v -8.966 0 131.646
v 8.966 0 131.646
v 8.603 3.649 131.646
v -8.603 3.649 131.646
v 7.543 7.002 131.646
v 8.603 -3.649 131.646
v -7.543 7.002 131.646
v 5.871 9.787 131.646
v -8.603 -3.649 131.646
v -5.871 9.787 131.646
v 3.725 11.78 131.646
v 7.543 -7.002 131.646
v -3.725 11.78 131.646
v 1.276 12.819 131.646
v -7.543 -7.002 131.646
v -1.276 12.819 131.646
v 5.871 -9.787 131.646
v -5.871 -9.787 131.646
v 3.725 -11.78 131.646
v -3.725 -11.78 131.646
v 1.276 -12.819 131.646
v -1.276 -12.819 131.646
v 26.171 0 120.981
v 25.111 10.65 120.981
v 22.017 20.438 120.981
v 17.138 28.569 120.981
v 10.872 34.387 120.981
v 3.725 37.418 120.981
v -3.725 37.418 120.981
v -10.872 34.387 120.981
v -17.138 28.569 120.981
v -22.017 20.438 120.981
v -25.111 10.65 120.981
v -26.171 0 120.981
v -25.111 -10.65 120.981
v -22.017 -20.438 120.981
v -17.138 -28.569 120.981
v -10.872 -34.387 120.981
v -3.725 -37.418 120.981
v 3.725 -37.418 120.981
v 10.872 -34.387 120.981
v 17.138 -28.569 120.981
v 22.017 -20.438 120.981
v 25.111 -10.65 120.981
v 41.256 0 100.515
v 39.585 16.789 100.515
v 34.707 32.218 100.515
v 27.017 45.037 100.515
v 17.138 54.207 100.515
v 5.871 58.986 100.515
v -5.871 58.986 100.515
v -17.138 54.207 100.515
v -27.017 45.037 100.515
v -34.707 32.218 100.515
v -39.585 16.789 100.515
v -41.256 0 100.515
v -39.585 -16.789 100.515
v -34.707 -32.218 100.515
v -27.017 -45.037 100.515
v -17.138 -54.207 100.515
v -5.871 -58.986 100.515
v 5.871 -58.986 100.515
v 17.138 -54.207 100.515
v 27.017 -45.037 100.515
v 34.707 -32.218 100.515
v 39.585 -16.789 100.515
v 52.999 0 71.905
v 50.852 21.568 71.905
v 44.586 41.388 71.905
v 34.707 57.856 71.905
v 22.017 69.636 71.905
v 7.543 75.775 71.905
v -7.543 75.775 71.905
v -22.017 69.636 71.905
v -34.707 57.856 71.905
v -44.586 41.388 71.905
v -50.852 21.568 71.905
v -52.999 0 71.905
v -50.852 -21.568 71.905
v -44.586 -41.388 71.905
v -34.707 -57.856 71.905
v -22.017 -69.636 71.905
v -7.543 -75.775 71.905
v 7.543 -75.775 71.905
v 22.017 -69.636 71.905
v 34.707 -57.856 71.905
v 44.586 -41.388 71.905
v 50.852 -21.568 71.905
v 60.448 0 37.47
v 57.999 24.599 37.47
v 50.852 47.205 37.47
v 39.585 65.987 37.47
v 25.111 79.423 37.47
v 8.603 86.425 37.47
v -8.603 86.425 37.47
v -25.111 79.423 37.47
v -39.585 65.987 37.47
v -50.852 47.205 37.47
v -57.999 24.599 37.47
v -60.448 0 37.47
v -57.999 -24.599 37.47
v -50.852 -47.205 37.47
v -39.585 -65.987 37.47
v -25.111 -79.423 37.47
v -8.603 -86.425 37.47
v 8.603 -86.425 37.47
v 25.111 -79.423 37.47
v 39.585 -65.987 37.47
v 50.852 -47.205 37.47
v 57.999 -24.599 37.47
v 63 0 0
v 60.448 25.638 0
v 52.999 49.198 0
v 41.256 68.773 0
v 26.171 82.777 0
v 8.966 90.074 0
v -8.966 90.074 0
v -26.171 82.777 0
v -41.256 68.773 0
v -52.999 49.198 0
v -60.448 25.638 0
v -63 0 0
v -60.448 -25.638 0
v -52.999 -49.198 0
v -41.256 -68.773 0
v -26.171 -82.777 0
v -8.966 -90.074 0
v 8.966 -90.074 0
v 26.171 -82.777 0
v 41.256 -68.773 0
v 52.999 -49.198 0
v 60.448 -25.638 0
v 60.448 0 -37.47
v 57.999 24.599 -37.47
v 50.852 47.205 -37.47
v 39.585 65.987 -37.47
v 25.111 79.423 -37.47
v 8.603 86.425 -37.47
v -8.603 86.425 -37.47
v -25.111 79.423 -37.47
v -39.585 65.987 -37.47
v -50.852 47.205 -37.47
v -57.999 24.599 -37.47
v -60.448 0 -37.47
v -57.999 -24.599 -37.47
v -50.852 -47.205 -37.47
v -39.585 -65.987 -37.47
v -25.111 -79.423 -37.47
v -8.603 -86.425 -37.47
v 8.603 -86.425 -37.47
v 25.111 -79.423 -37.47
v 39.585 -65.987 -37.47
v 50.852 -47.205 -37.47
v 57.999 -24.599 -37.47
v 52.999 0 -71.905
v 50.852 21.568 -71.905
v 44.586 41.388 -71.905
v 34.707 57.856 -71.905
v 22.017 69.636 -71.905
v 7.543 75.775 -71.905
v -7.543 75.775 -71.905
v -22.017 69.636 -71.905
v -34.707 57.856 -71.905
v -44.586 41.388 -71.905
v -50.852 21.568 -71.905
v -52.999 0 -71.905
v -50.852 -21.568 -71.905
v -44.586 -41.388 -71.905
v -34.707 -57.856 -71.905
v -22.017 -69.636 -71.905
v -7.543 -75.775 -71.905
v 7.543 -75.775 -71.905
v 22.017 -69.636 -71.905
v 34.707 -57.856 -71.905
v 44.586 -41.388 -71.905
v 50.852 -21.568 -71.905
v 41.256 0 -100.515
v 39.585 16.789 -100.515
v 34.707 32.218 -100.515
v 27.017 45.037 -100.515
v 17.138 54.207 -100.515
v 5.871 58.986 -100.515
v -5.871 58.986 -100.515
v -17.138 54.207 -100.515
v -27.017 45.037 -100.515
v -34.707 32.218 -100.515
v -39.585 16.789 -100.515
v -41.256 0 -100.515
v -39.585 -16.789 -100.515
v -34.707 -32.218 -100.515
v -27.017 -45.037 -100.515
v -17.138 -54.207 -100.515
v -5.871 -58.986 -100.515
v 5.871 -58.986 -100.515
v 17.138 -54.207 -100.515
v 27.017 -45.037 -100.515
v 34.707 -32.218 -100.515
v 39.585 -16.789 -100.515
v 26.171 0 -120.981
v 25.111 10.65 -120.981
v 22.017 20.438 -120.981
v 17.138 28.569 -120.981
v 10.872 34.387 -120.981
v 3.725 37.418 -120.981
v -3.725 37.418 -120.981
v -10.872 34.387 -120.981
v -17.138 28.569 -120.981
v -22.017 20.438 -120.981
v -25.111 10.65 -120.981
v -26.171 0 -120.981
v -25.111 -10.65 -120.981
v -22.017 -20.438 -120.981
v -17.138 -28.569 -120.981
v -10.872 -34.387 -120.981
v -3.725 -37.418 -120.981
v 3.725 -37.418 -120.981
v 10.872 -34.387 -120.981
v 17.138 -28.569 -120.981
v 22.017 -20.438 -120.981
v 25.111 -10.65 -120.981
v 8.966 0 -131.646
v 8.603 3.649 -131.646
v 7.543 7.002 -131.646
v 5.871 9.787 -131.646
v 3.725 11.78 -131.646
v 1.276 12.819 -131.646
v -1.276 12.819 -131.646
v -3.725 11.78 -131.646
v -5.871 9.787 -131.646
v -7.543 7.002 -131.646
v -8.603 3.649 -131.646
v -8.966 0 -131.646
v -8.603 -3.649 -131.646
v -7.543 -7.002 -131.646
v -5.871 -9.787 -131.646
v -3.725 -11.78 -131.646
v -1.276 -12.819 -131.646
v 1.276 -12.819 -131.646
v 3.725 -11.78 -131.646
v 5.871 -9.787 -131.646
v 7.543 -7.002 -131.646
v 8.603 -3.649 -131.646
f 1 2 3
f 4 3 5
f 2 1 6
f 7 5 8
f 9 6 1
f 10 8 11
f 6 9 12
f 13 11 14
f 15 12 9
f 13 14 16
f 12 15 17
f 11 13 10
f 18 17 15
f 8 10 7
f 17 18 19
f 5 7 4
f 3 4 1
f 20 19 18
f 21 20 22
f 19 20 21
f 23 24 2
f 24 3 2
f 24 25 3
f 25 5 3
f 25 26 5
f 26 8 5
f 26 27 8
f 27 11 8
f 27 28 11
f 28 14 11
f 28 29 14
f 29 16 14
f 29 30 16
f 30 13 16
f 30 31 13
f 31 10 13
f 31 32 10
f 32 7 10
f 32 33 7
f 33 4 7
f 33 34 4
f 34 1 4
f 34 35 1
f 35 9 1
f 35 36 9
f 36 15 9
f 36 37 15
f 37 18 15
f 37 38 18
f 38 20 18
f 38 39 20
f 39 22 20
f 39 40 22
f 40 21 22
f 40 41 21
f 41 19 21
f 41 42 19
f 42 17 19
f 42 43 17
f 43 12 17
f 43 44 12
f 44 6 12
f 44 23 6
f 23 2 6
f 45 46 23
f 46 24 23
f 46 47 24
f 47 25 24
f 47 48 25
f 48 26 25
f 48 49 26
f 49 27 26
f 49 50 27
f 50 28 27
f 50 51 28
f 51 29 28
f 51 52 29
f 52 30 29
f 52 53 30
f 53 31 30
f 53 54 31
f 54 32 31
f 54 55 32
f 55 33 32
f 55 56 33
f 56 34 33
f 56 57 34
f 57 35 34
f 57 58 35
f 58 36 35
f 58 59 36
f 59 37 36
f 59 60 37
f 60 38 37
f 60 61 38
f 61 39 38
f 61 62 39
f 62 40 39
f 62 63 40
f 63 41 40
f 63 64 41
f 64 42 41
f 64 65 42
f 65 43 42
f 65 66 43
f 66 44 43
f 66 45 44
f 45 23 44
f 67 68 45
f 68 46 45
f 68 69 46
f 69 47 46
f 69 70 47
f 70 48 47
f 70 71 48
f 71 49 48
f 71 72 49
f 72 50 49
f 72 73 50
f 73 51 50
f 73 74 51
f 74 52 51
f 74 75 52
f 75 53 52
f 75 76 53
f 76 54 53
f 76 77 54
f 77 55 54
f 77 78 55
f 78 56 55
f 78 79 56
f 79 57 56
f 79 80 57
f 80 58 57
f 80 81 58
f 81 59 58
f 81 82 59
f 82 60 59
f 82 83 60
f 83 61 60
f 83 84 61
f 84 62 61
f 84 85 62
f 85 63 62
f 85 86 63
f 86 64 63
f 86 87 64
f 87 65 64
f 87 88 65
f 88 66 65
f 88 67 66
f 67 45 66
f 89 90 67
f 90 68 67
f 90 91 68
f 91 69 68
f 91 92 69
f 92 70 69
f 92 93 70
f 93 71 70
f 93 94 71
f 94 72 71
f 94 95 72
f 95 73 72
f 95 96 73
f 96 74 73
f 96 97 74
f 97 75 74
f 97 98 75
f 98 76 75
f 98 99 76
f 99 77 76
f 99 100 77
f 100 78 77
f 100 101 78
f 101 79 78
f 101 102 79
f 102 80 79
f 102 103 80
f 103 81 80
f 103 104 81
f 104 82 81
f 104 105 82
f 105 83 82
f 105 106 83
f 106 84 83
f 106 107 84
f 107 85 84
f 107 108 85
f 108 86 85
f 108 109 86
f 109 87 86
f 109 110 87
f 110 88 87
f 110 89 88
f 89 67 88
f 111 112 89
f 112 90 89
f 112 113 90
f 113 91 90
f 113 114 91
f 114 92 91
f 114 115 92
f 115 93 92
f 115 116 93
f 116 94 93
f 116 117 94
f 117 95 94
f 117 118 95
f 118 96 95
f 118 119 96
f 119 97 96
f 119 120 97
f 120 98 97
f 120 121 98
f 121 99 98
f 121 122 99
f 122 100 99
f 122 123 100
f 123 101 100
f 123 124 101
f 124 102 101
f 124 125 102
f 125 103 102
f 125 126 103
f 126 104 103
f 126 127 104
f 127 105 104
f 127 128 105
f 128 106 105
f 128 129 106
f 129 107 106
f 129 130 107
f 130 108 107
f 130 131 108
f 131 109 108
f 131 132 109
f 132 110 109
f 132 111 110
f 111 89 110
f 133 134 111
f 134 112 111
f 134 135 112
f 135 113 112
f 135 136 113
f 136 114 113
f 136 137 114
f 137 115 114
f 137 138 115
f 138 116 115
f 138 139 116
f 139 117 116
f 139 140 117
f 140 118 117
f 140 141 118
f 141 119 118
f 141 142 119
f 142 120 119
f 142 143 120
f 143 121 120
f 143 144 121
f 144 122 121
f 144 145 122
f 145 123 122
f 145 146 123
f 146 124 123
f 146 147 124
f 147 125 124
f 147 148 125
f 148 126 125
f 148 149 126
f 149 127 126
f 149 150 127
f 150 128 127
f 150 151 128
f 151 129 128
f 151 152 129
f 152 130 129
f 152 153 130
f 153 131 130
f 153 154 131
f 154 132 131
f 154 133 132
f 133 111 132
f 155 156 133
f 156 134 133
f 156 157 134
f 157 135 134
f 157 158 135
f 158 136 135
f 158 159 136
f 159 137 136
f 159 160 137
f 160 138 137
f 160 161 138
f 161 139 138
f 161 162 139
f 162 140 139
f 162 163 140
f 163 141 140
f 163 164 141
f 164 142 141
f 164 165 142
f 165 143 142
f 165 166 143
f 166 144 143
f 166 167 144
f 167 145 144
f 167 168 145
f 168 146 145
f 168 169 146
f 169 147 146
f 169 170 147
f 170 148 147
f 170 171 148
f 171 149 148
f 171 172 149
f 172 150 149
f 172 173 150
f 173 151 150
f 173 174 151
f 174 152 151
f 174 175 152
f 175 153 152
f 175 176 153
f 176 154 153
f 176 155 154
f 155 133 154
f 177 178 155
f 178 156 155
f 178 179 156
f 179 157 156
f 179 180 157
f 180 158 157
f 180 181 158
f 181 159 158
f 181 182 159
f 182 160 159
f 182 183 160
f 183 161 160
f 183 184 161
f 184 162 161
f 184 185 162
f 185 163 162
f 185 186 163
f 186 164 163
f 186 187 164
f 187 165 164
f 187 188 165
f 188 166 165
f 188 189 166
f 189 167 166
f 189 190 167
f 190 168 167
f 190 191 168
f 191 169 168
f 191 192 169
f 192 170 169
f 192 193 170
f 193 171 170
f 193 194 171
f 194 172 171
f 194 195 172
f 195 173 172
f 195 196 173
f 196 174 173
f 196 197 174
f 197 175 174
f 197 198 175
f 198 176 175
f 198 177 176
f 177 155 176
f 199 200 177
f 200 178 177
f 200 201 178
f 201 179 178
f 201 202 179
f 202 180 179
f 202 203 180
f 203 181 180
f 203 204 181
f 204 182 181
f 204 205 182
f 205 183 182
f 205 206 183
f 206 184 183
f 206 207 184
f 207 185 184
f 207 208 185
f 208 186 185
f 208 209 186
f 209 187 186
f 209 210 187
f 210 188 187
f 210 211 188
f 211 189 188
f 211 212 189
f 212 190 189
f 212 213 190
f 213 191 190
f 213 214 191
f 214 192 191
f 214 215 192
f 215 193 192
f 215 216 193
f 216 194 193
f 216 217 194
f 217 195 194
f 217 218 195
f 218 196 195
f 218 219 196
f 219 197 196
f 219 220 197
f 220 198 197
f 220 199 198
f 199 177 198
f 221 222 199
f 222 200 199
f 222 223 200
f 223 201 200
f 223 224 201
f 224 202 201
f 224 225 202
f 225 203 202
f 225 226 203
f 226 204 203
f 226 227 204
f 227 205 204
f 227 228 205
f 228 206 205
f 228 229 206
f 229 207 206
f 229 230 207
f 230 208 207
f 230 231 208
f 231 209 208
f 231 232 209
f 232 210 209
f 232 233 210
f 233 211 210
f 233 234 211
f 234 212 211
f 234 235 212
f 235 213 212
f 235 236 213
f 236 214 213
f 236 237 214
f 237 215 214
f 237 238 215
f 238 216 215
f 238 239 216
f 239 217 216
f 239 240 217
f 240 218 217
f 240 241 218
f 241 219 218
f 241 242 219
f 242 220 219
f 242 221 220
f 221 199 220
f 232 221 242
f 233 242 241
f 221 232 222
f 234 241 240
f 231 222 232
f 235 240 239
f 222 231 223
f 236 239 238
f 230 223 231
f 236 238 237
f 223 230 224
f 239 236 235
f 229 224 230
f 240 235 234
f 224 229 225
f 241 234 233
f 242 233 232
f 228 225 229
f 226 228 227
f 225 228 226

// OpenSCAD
// Generated by SolidPython 1.0.1 on 2020-07-29 00:46:49


scale(v = [9, 13, 19]) {
	sphere(r = 7);
}
/***********************************************
*********      SolidPython code:      **********
************************************************
 
# import packages: SolidPython
from solid import *
from solid.utils import *
from itertools import chain, combinations, permutations


class Resize:

    def __init__(self, scad_file):
        self.scad_file = scad_file
        #self.scad_file = import_scad(scad_file)
        # cone/cylinder param:
        self.r1 = 0
        self.r2 = 0
        self.h = 0
        # rectangular prism param:
        self.w = 0
        self.l = 0
        # ellipse param:
        self.r = 0

    # import OpenScad code (file name corresponds to shape)


    # classify shape + parameters
    def assign(self, param1, param2, param3):
        if self.scad_file == 'cone.scad':
            self.r1 = param1
            self.r2 = param2
            self.h = param3
        elif self.scad_file == 'cylinder.scad':
            self.r1 = param1
            self.r2 = param2
            self.h = param3
        elif self.scad_file == 'rectangularPrism.scad':
            self.h = param1
            self.l = param2
            self.w = param3
        else:
            self.r = param1
            self.h = param2

    # resize parameters
    def iterate(self):
        x = range(3, 20, 2)
        i = 1
        if self.scad_file == 'cone.scad':
            tempList = list(permutations(x, 2))
            for temp in tempList:
                param1 = temp[0]
                param2 = temp[1]
                filepath = 'produced_scad_files/' + 'cone' + str(param1) + '_' + str(param2) + '_' + '.scad'
                scad_render_to_file(cylinder(h=param1, r1=param2, r2=0), filepath)

        elif self.scad_file == 'cylinder.scad':
            tempList = list(permutations(x, 3))
            for temp in tempList:
                param1 = temp[0]
                param2 = temp[1]
                filepath = 'produced_scad_files/' + 'cylinder' + str(param1) + '_' + str(param2) + '_' + '.scad'
                scad_render_to_file(cylinder(h=param1, r1=param2, r2=param2), filepath)

        elif self.scad_file == 'rectangularPrism.scad':
            tempList = list(permutations(x, 3))
            for temp in tempList:
                param1 = temp[0]
                param2 = temp[1]
                param3 = temp[2]
                filepath = 'produced_scad_files/' + 'rectangularPrism' + str(param1) + '_' + str(param2) + '_' + str(
                    param3) + '.scad'
                scad_render_to_file(cube(size=(param1, param2, param3)), filepath)

        elif self.scad_file == 'ellipse.scad':
            tempList = list(permutations(x, 4))
            for temp in tempList:
                param1 = temp[0]
                param2 = temp[1]
                param3 = temp[2]
                param4 = temp[3]
                filepath = 'produced_scad_files/' + 'ellipse' + str(param1) + '_' + str(param2) + '_' + str(param3) + '_' + str(param4) + '.scad'
                scad_render_to_file(scale([param1, param2, param3])(sphere(r=param4)), filepath)

    def render_to_scadfile(self):
        scad_render_to_file(scad, 'example.scad') 
 
************************************************/
